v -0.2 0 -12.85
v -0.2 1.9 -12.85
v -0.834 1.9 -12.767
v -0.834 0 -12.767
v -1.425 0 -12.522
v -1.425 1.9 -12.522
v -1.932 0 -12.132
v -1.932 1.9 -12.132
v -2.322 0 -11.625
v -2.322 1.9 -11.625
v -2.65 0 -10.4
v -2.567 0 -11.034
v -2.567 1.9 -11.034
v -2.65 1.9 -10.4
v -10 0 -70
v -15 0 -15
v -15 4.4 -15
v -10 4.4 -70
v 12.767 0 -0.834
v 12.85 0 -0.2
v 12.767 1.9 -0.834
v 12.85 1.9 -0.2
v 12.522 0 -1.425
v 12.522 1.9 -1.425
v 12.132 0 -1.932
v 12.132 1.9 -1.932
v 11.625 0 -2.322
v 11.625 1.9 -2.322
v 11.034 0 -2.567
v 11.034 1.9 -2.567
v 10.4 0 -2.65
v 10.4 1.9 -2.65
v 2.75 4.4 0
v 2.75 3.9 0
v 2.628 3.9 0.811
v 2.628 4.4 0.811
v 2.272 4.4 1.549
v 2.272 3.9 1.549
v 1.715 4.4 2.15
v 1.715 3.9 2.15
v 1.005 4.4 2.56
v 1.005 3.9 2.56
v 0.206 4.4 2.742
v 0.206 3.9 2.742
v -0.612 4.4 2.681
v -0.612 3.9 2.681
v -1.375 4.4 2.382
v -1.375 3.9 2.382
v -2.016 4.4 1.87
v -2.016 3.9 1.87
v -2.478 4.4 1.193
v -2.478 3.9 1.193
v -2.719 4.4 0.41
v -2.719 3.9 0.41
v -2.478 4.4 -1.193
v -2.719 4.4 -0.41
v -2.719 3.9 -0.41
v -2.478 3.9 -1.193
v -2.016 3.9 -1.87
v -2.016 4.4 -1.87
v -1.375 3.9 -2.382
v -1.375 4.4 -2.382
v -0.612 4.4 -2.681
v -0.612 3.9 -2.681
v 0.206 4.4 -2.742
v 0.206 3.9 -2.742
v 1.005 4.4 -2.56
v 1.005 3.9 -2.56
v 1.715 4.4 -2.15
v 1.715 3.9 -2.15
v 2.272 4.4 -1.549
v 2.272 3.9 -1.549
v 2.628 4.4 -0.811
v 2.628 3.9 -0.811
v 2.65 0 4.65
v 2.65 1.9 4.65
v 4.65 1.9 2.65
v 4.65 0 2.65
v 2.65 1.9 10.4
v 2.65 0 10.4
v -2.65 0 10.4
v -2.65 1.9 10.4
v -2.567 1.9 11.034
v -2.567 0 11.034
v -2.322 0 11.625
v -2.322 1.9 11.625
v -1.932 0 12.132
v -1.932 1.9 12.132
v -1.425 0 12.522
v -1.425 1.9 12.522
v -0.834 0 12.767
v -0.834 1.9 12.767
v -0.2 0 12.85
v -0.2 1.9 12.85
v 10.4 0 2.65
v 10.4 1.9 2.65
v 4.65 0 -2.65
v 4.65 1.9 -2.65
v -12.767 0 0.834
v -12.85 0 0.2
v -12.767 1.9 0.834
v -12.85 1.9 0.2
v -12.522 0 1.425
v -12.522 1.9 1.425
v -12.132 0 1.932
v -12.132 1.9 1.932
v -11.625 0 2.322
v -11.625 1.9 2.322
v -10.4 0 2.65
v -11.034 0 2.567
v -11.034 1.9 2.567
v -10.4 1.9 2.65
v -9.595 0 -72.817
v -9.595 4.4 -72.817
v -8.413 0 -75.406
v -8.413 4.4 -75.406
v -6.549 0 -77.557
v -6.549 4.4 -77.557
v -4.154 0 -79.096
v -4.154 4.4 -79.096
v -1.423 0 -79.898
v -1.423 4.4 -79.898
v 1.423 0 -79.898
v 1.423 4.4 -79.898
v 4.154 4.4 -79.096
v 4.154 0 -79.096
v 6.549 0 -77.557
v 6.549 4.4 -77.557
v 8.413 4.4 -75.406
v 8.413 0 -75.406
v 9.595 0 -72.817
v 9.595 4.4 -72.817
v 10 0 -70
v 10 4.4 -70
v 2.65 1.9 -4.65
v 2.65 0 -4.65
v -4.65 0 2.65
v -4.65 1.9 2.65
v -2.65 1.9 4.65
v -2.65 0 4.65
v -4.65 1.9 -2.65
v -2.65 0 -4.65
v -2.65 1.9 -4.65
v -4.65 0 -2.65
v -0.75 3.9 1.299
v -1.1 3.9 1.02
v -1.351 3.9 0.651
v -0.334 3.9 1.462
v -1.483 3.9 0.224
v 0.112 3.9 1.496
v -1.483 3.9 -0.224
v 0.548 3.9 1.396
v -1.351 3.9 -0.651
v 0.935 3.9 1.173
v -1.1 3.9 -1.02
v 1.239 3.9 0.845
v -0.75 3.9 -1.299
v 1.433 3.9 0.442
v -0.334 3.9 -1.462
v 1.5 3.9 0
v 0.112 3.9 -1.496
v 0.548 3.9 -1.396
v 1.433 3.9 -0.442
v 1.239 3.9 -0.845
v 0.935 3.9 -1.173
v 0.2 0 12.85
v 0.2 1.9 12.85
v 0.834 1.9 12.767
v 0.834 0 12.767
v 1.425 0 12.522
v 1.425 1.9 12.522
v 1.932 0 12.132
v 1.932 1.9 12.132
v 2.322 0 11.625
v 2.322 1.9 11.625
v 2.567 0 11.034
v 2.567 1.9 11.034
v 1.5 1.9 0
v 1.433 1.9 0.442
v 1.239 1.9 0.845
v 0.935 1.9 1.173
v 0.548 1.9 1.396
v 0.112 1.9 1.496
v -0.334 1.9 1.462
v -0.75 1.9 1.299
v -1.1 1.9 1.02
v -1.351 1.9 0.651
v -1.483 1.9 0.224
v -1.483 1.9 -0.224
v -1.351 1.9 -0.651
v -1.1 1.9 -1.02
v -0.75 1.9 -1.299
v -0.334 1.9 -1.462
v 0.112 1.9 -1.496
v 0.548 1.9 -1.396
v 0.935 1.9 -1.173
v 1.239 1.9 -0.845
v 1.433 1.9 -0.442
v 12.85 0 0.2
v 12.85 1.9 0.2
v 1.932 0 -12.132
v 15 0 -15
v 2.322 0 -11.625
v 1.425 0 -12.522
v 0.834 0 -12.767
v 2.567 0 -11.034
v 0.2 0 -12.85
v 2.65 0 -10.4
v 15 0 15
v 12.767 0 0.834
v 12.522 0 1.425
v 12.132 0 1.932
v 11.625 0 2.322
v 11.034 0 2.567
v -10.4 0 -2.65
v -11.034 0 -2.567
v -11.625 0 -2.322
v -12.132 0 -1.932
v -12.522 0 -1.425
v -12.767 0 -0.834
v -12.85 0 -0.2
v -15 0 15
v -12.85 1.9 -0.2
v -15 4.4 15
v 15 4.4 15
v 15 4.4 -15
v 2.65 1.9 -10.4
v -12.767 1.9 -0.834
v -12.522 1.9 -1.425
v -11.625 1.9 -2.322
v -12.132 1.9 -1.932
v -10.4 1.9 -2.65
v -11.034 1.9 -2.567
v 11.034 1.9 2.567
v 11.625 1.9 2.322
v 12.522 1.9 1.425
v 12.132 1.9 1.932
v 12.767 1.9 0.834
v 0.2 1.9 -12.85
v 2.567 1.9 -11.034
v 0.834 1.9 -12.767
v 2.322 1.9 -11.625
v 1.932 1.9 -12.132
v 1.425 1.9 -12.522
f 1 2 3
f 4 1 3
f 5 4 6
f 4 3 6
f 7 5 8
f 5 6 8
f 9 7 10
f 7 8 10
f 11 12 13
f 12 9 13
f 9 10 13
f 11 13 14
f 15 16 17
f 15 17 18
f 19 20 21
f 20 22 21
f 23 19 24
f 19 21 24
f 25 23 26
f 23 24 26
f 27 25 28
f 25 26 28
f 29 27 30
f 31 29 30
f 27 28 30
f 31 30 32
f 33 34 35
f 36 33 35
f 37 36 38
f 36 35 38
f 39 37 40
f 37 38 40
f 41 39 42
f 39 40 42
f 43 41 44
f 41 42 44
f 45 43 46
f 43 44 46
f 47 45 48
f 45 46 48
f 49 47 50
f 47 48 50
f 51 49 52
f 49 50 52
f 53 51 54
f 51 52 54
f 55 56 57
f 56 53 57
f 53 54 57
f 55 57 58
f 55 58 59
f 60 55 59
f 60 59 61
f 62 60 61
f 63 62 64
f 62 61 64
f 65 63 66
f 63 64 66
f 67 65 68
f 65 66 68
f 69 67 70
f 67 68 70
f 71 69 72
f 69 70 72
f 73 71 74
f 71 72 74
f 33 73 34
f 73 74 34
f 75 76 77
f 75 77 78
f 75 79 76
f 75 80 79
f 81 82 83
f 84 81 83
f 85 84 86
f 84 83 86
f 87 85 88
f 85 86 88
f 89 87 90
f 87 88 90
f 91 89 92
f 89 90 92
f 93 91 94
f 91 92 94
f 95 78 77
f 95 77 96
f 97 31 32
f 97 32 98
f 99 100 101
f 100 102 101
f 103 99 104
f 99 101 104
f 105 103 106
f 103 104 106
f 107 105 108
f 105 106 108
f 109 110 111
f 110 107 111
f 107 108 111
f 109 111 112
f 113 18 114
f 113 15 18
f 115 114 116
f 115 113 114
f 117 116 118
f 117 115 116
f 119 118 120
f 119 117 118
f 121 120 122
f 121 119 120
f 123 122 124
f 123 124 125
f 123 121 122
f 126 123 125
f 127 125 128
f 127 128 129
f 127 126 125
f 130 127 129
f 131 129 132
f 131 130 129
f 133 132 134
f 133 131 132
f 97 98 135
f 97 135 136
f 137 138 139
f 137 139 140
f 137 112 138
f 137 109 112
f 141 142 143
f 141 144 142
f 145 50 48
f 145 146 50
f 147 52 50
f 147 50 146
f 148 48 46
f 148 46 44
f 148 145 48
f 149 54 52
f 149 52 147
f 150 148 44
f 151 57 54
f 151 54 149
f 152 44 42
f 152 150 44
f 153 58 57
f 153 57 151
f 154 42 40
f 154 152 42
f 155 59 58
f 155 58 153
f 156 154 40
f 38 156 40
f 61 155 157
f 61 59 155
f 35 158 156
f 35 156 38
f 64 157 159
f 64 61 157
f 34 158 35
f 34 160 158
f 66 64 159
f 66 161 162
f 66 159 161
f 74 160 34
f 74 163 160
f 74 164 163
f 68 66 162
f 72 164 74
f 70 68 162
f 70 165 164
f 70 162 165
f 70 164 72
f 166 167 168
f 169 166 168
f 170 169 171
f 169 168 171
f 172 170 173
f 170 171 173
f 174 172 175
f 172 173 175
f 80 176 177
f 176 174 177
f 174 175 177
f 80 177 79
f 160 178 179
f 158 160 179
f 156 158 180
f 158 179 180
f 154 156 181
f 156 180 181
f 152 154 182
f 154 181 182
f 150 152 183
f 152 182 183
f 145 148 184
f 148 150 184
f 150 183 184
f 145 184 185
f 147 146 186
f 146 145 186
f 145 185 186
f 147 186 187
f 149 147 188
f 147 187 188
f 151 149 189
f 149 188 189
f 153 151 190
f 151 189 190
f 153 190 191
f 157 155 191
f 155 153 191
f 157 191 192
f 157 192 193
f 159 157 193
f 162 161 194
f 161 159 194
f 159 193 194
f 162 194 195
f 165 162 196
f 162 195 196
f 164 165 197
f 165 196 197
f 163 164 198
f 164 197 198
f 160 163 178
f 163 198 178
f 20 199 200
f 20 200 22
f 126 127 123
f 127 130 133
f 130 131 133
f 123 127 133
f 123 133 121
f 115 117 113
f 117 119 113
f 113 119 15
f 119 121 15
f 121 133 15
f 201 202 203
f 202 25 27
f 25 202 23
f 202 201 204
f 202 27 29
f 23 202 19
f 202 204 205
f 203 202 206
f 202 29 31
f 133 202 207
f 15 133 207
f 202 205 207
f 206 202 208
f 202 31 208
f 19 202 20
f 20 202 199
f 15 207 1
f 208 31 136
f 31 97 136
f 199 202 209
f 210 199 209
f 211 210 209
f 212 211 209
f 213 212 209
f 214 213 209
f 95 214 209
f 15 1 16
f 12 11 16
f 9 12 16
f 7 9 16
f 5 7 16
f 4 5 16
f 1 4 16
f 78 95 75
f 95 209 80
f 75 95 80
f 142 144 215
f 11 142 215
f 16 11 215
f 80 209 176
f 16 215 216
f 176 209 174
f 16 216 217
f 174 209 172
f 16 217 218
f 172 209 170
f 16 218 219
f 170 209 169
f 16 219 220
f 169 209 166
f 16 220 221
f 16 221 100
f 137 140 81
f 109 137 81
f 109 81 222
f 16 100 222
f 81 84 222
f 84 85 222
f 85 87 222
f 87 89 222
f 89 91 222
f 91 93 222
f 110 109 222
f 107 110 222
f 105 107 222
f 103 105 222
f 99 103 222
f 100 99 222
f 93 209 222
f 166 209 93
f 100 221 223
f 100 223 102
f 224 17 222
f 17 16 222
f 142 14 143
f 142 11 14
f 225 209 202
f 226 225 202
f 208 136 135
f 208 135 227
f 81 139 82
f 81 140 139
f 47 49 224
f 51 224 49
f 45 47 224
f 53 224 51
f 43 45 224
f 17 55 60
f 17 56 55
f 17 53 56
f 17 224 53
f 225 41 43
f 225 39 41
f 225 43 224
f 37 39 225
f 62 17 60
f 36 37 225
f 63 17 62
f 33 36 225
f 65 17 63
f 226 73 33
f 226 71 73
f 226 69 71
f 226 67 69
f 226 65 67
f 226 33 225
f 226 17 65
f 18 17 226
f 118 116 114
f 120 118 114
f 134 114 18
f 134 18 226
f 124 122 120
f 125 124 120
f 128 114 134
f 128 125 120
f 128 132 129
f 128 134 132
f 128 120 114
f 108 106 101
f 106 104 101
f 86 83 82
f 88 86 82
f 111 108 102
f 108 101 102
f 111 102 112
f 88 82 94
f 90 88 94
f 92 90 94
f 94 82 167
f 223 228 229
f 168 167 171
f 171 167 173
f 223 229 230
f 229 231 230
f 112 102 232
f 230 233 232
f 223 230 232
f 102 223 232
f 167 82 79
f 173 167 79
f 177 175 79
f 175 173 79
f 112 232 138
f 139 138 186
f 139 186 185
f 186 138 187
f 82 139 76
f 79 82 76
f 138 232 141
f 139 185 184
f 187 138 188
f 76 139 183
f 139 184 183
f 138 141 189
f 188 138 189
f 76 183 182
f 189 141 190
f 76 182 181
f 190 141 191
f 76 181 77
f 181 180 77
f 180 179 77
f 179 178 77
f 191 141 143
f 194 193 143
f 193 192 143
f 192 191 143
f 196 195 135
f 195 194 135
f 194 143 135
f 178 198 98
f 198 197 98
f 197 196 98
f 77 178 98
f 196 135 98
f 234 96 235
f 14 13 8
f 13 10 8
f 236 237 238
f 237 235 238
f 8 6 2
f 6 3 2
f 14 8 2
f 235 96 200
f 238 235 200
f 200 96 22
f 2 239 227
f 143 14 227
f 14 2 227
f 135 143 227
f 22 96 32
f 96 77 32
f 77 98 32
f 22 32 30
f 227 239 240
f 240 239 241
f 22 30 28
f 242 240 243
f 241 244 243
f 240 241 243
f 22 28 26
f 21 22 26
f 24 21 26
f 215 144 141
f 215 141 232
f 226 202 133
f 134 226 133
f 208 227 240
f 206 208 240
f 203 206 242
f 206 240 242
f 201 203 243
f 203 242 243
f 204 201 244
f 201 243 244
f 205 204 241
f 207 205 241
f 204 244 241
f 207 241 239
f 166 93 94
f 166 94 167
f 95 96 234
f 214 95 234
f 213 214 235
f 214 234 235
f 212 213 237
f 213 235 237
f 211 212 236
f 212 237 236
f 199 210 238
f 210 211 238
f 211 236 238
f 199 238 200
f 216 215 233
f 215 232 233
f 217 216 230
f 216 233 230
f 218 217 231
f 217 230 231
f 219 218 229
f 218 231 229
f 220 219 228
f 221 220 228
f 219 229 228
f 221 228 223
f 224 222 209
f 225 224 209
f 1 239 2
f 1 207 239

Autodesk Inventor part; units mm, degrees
ref_plane "YZ Plane" through (0, 0, 0) normal (1, 0, 0) x (0, 1, 0)
ref_plane "XZ Plane" through (0, 0, 0) normal (0, 1, 0) x (-1, 0, 0)
ref_plane "XY Plane" through (0, 0, 0) normal (0, 0, 1) x (1, 0, 0)
sketch "Sketch1" plane through (0, 0, 0) normal (0, 1, 0) x (-1, 0, 0)
  line L0 (-15, -15) -> (15, -15)
  line L1 (15, -15) -> (15, 15)
  line L2 (15, 15) -> (-15, 15)
  line L3 (-15, 15) -> (-15, -15)
  line L4 (-15, -15) -> (15, 15) construction
  line L5 (15, -15) -> (-15, 15) construction
  line L6 (-2.45, -12.65) -> (2.45, -12.65) construction
  line L7 (2.45, -12.65) -> (2.45, 12.65) construction
  line L8 (2.45, 12.65) -> (-2.45, 12.65) construction
  line L9 (-2.45, 12.65) -> (-2.45, -12.65) construction
  line L10 (-2.45, -12.65) -> (2.45, 12.65) construction
  line L11 (2.45, -12.65) -> (-2.45, 12.65) construction
  line L12 (-12.65, -2.45) -> (12.65, -2.45) construction
  line L13 (12.65, -2.45) -> (12.65, 2.45) construction
  line L14 (12.65, 2.45) -> (-12.65, 2.45) construction
  line L15 (-12.65, 2.45) -> (-12.65, -2.45) construction
  line L16 (-12.65, -2.45) -> (12.65, 2.45) construction
  line L17 (12.65, -2.45) -> (-12.65, 2.45) construction
  line L18 (-12.85, -2.65) -> (12.85, -2.65)
  line L19 (12.85, -2.65) -> (12.85, 2.65)
  line L20 (12.85, 2.65) -> (-12.85, 2.65)
  line L21 (-12.85, 2.65) -> (-12.85, -2.65)
  line L22 (-12.85, -2.65) -> (12.85, 2.65) construction
  line L23 (12.85, -2.65) -> (-12.85, 2.65) construction
  line L24 (-2.65, -12.85) -> (2.65, -12.85)
  line L25 (2.65, -12.85) -> (2.65, 12.85)
  line L26 (2.65, 12.85) -> (-2.65, 12.85)
  line L27 (-2.65, 12.85) -> (-2.65, -12.85)
  line L28 (-2.65, -12.85) -> (2.65, 12.85) construction
  line L29 (2.65, -12.85) -> (-2.65, 12.85) construction
  point P0 (0, 0)
  point P1 (0, 0)
  dimension "d0" = 30
  dimension "d1" = 4.9
  dimension "d2" = 10.2
  dimension "d3" = 0.2
  dimension "d4" = 0.2
extrude "Extrusion1" add sketch "Sketch1" along normal blind 1.9
sketch "Sketch2" plane through (0, 1.9, 0) normal (0, 1, 0) x (1, 0, 0)
  line L0 (15, 15) -> (-15, 15) projected
  line L1 (-15, 15) -> (-15, -15) projected
  line L2 (-15, -15) -> (15, -15) projected
  line L3 (15, -15) -> (15, 15) projected
  circle A0 centre (0, 0) radius 1.5
  dimension "d7" = 3
extrude "Extrusion2" add sketch "Sketch2" along normal blind 2
sketch "Sketch3" plane through (0, 3.9, 0) normal (0, 1, 0) x (1, 0, 0)
  circle A0 centre (0, 0) radius 1.5 projected
  line L0 (15, 15) -> (-15, 15) projected
  line L1 (-15, 15) -> (-15, -15) projected
  line L2 (-15, -15) -> (15, -15) projected
  line L3 (15, -15) -> (15, 15) projected
  circle A1 centre (0, 0) radius 2.75
  dimension "d10" = 5.5
extrude "Extrusion3" add sketch "Sketch3" along normal blind 0.5 contours L3 L2 L1 L0
chamfer "Chamfer1" distance 2 angle 45 1 edges at (-2.65, 0.95, -2.65)
fillet "Fillet1" radius 2.45 1 edges at (-12.85, 0.95, -2.65)
fillet "Fillet2" radius 2.45 1 edges at (-2.65, 0.95, -12.85)
chamfer "Chamfer2" distance 2 angle 45 1 edges at (2.65, 0.95, -2.65)
chamfer "Chamfer3" distance 2 angle 45 1 edges at (2.65, 0.95, 2.65)
fillet "Fillet3" radius 2.45 1 edges at (12.85, 0.95, -2.65)
fillet "Fillet4" radius 2.45 1 edges at (2.65, 0.95, -12.85)
fillet "Fillet5" radius 2.45 1 edges at (12.85, 0.95, 2.65)
fillet "Fillet6" radius 2.45 1 edges at (2.65, 0.95, 12.85)
chamfer "Chamfer4" distance 2 angle 45 1 edges at (-2.65, 0.95, 2.65)
fillet "Fillet7" radius 2.45 2 edges at (-2.65, 0.95, 12.85) (-12.85, 0.95, 2.65)
sketch "Sketch4" plane through (0, 0, 0) normal (0, -1, 0) x (1, 0, 0)
  line L0 (15, -15) -> (-15, -15) projected
  line L1 (-10.4, 2.65) -> (-4.65, 2.65) projected
  line L2 (0, 0) -> (0, -74.1645) construction
  line L3 (-15, -15) -> (-10, -70)
  line L4 (15, -15) -> (10, -70)
  line L5 (-10, -70) -> (10, -70)
  arc A0 (-10, -70) -> (10, -70) centre (0, -70) ccw
  dimension "d32" = 70
  dimension "d33" = 20
extrude "Extrusion4" add sketch "Sketch4" against normal up to surface (4.4 mm away)
equation "\"d0\" = BackLowerLegKneeWidth"
equation "\"d1\" = ServoArmWidth"
equation "\"d2\" = ServoArmLength"
equation "\"d3\" = ServoArmSpacing"
equation "\"d4\" = ServoArmSpacing"
equation "\"d5\" = ServoArmThickness"
equation "\"d7\" = ServoArmHoleRequired"
equation "\"d8\" = MinimalThickness"
equation "\"d10\" = ServoArmHeadScrewTrace"
equation "\"d11\" = ServoArmHeadScrewThickness"
equation "\"d13\" = ServoArmInternFillet"
equation "\"d16\" = ServoArmExternFillet"
equation "\"d17\" = ServoArmExternFillet"
equation "\"d18\" = ServoArmInternFillet"
equation "\"d21\" = ServoArmInternFillet"
equation "\"d24\" = ServoArmExternFillet"
equation "\"d25\" = ServoArmExternFillet"
equation "\"d26\" = ServoArmExternFillet"
equation "\"d27\" = ServoArmExternFillet"
equation "\"d28\" = ServoArmInternFillet"
equation "\"d31\" = ServoArmExternFillet"
equation "\"d32\" = BackLowerLegLength"
equation "\"d33\" = BackLowerLegFootWidth"
equation "\"d34\" = ServoArmHoleRequired"
equation "\"BackLowerLegLength\" = 70"
equation "\"BackLowerLegFootWidth\" = 20"
equation "\"BackLowerLegKneeWidth\" = 30"
equation "\"ServoArmWidth\" = 4.9"
equation "\"ServoArmLength\" = 10.2"
equation "\"ServoArmSpacing\" = 0.2"
equation "\"ServoArmThickness\" = 1.9"
equation "\"ServoArmHoleRequired\" = 3"
equation "\"MinimalThickness\" = 2"
equation "\"ServoArmHeadScrewTrace\" = 5.5"
equation "\"ServoArmHeadScrewThickness\" = 0.5"
equation "\"ServoArmInternFillet\" = 2"
equation "\"ServoArmExternFillet\" = 2.45"
properties part number "BackLowerLeg" material "PC/ABS Plastic"
